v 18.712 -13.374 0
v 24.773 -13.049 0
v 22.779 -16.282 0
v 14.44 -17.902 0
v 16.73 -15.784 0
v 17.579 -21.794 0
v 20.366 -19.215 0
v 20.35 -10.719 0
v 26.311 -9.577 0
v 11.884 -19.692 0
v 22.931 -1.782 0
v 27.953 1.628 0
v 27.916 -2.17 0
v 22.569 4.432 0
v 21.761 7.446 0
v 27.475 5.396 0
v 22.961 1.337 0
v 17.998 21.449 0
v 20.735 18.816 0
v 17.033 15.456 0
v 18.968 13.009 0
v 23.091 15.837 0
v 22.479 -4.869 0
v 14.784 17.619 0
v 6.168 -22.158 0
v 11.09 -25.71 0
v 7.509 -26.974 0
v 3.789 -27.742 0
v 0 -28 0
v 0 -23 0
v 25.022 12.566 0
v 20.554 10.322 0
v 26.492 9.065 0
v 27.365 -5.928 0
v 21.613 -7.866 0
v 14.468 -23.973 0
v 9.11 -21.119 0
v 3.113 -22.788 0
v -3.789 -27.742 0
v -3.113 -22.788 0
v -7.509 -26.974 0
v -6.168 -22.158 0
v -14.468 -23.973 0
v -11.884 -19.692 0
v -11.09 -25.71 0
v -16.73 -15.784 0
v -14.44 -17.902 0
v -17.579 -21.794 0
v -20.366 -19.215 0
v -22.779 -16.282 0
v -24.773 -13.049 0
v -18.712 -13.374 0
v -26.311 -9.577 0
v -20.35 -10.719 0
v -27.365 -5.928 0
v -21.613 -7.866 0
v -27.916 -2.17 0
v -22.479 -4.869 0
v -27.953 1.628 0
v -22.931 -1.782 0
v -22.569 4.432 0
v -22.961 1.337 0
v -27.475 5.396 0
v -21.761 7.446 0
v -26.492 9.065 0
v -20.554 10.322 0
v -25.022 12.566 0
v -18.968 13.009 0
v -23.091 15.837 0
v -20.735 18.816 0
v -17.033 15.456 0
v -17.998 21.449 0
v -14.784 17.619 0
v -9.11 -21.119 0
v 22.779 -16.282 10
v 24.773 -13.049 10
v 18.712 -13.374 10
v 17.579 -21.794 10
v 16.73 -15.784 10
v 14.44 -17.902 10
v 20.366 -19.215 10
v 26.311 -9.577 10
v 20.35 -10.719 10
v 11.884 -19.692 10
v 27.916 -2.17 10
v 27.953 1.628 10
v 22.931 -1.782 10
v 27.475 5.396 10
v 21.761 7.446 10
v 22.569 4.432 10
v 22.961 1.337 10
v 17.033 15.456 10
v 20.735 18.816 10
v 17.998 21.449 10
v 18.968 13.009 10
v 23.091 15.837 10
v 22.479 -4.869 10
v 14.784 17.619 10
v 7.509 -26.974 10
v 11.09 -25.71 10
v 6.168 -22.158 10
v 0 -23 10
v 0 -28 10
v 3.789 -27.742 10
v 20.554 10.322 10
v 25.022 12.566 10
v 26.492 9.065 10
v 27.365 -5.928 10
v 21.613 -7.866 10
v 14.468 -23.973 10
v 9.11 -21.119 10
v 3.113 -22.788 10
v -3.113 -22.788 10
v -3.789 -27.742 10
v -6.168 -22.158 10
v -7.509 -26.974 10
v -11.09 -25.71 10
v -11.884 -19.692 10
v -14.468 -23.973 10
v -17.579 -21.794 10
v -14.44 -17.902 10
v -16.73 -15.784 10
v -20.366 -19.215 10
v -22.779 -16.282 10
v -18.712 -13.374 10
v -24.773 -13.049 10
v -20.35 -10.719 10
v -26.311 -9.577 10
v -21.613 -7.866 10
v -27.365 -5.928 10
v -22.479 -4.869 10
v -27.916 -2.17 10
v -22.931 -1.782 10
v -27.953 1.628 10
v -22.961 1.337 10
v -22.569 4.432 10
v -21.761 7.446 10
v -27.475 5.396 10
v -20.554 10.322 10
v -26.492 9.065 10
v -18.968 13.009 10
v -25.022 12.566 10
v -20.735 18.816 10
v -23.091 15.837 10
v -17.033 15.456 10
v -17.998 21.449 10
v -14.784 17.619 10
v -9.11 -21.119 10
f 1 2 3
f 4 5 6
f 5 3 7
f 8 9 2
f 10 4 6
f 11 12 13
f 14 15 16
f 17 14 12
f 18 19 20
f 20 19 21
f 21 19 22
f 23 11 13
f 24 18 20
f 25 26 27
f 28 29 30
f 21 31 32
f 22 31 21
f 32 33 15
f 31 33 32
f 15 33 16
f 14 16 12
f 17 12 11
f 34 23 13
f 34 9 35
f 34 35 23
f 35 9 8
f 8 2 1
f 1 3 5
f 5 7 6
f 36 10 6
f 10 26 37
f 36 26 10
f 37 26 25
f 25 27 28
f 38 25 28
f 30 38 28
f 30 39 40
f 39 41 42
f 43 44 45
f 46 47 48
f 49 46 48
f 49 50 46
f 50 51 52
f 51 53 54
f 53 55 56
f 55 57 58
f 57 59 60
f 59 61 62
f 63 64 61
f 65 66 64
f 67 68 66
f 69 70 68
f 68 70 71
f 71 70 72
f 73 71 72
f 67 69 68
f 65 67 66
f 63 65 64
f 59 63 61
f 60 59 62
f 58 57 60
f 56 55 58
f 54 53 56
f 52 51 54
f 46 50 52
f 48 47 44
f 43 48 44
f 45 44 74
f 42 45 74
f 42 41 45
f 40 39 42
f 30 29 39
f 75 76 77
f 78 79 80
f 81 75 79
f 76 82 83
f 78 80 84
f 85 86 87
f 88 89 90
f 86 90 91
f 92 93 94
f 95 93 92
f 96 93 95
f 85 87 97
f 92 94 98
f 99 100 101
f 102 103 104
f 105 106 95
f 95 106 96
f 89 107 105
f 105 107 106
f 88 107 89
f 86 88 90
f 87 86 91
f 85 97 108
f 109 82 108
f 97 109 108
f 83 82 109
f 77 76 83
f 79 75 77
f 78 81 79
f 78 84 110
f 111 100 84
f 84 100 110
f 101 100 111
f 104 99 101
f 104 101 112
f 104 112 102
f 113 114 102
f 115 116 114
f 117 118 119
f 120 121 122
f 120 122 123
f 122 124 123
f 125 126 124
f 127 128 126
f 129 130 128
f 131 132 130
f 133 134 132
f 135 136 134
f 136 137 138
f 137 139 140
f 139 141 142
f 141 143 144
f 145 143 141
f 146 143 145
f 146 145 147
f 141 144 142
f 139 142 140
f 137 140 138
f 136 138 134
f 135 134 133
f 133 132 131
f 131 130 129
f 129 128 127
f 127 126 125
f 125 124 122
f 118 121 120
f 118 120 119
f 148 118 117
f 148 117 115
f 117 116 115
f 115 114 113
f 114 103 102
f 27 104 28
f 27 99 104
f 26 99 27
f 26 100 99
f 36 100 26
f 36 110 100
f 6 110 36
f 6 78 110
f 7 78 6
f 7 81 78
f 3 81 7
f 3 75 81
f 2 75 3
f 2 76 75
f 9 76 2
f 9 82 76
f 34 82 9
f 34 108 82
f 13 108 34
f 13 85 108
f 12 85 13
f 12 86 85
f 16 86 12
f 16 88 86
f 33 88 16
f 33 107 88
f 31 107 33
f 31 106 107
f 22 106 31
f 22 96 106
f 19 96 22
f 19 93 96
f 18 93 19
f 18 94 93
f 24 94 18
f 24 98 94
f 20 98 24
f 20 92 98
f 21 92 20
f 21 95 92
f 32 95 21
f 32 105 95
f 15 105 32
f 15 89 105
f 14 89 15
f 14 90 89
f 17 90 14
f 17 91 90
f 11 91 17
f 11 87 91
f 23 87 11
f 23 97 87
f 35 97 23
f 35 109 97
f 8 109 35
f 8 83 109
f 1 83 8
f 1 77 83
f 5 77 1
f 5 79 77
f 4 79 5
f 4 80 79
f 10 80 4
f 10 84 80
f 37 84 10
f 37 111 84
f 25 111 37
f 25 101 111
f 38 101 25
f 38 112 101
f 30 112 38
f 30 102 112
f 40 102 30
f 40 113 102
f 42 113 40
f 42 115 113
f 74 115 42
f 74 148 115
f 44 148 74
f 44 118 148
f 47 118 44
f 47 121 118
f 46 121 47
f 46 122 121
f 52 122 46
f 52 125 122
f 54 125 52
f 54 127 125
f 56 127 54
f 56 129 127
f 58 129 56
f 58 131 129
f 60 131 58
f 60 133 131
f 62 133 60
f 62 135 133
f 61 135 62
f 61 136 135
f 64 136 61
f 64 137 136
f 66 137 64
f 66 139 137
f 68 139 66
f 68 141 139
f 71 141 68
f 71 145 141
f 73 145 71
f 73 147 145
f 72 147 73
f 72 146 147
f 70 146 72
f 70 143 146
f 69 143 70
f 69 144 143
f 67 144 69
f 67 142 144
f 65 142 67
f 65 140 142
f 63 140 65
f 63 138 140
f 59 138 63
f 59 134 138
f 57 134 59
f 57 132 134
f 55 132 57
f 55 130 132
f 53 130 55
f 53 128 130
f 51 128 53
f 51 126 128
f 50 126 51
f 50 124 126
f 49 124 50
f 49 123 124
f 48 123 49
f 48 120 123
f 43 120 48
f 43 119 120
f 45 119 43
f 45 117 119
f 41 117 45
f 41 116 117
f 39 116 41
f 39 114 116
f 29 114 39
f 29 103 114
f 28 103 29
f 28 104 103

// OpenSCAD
$fn = 32;

// ----------------------------------------------------------------------
// Spring clip: 56 mm outside, 5 mm band, 80 degree opening
// ----------------------------------------------------------------------

// --- parameters (mm) ---
outer_r = 28;             // clip outside radius
inner_r = 23;             // clip bore radius
band = 5;                 // band thickness
clip_w = 10;              // clip width
opening = 80;             // opening angle

clip_profile = [[-17.998, 21.449], [-20.735, 18.816], [-23.091, 15.837], [-25.022, 12.566], [-26.492, 9.065], [-27.475, 5.396], [-27.953, 1.628], [-27.916, -2.17], [-27.365, -5.928], [-26.311, -9.577], [-24.773, -13.049], [-22.779, -16.282], [-20.366, -19.215], [-17.579, -21.794], [-14.468, -23.973], [-11.09, -25.71], [-7.509, -26.974], [-3.789, -27.742], [0, -28], [3.789, -27.742], [7.509, -26.974], [11.09, -25.71], [14.468, -23.973], [17.579, -21.794], [20.366, -19.215], [22.779, -16.282], [24.773, -13.049], [26.311, -9.577], [27.365, -5.928], [27.916, -2.17], [27.953, 1.628], [27.475, 5.396], [26.492, 9.065], [25.022, 12.566], [23.091, 15.837], [20.735, 18.816], [17.998, 21.449], [14.784, 17.619], [17.033, 15.456], [18.968, 13.009], [20.554, 10.322], [21.761, 7.446], [22.569, 4.432], [22.961, 1.337], [22.931, -1.782], [22.479, -4.869], [21.613, -7.866], [20.35, -10.719], [18.712, -13.374], [16.73, -15.784], [14.44, -17.902], [11.884, -19.692], [9.11, -21.119], [6.168, -22.158], [3.113, -22.788], [0, -23], [-3.113, -22.788], [-6.168, -22.158], [-9.11, -21.119], [-11.884, -19.692], [-14.44, -17.902], [-16.73, -15.784], [-18.712, -13.374], [-20.35, -10.719], [-21.613, -7.866], [-22.479, -4.869], [-22.931, -1.782], [-22.961, 1.337], [-22.569, 4.432], [-21.761, 7.446], [-20.554, 10.322], [-18.968, 13.009], [-17.033, 15.456], [-14.784, 17.619]];

difference() {
  union() {
    linear_extrude(height = clip_w) polygon(clip_profile);
  }
}
